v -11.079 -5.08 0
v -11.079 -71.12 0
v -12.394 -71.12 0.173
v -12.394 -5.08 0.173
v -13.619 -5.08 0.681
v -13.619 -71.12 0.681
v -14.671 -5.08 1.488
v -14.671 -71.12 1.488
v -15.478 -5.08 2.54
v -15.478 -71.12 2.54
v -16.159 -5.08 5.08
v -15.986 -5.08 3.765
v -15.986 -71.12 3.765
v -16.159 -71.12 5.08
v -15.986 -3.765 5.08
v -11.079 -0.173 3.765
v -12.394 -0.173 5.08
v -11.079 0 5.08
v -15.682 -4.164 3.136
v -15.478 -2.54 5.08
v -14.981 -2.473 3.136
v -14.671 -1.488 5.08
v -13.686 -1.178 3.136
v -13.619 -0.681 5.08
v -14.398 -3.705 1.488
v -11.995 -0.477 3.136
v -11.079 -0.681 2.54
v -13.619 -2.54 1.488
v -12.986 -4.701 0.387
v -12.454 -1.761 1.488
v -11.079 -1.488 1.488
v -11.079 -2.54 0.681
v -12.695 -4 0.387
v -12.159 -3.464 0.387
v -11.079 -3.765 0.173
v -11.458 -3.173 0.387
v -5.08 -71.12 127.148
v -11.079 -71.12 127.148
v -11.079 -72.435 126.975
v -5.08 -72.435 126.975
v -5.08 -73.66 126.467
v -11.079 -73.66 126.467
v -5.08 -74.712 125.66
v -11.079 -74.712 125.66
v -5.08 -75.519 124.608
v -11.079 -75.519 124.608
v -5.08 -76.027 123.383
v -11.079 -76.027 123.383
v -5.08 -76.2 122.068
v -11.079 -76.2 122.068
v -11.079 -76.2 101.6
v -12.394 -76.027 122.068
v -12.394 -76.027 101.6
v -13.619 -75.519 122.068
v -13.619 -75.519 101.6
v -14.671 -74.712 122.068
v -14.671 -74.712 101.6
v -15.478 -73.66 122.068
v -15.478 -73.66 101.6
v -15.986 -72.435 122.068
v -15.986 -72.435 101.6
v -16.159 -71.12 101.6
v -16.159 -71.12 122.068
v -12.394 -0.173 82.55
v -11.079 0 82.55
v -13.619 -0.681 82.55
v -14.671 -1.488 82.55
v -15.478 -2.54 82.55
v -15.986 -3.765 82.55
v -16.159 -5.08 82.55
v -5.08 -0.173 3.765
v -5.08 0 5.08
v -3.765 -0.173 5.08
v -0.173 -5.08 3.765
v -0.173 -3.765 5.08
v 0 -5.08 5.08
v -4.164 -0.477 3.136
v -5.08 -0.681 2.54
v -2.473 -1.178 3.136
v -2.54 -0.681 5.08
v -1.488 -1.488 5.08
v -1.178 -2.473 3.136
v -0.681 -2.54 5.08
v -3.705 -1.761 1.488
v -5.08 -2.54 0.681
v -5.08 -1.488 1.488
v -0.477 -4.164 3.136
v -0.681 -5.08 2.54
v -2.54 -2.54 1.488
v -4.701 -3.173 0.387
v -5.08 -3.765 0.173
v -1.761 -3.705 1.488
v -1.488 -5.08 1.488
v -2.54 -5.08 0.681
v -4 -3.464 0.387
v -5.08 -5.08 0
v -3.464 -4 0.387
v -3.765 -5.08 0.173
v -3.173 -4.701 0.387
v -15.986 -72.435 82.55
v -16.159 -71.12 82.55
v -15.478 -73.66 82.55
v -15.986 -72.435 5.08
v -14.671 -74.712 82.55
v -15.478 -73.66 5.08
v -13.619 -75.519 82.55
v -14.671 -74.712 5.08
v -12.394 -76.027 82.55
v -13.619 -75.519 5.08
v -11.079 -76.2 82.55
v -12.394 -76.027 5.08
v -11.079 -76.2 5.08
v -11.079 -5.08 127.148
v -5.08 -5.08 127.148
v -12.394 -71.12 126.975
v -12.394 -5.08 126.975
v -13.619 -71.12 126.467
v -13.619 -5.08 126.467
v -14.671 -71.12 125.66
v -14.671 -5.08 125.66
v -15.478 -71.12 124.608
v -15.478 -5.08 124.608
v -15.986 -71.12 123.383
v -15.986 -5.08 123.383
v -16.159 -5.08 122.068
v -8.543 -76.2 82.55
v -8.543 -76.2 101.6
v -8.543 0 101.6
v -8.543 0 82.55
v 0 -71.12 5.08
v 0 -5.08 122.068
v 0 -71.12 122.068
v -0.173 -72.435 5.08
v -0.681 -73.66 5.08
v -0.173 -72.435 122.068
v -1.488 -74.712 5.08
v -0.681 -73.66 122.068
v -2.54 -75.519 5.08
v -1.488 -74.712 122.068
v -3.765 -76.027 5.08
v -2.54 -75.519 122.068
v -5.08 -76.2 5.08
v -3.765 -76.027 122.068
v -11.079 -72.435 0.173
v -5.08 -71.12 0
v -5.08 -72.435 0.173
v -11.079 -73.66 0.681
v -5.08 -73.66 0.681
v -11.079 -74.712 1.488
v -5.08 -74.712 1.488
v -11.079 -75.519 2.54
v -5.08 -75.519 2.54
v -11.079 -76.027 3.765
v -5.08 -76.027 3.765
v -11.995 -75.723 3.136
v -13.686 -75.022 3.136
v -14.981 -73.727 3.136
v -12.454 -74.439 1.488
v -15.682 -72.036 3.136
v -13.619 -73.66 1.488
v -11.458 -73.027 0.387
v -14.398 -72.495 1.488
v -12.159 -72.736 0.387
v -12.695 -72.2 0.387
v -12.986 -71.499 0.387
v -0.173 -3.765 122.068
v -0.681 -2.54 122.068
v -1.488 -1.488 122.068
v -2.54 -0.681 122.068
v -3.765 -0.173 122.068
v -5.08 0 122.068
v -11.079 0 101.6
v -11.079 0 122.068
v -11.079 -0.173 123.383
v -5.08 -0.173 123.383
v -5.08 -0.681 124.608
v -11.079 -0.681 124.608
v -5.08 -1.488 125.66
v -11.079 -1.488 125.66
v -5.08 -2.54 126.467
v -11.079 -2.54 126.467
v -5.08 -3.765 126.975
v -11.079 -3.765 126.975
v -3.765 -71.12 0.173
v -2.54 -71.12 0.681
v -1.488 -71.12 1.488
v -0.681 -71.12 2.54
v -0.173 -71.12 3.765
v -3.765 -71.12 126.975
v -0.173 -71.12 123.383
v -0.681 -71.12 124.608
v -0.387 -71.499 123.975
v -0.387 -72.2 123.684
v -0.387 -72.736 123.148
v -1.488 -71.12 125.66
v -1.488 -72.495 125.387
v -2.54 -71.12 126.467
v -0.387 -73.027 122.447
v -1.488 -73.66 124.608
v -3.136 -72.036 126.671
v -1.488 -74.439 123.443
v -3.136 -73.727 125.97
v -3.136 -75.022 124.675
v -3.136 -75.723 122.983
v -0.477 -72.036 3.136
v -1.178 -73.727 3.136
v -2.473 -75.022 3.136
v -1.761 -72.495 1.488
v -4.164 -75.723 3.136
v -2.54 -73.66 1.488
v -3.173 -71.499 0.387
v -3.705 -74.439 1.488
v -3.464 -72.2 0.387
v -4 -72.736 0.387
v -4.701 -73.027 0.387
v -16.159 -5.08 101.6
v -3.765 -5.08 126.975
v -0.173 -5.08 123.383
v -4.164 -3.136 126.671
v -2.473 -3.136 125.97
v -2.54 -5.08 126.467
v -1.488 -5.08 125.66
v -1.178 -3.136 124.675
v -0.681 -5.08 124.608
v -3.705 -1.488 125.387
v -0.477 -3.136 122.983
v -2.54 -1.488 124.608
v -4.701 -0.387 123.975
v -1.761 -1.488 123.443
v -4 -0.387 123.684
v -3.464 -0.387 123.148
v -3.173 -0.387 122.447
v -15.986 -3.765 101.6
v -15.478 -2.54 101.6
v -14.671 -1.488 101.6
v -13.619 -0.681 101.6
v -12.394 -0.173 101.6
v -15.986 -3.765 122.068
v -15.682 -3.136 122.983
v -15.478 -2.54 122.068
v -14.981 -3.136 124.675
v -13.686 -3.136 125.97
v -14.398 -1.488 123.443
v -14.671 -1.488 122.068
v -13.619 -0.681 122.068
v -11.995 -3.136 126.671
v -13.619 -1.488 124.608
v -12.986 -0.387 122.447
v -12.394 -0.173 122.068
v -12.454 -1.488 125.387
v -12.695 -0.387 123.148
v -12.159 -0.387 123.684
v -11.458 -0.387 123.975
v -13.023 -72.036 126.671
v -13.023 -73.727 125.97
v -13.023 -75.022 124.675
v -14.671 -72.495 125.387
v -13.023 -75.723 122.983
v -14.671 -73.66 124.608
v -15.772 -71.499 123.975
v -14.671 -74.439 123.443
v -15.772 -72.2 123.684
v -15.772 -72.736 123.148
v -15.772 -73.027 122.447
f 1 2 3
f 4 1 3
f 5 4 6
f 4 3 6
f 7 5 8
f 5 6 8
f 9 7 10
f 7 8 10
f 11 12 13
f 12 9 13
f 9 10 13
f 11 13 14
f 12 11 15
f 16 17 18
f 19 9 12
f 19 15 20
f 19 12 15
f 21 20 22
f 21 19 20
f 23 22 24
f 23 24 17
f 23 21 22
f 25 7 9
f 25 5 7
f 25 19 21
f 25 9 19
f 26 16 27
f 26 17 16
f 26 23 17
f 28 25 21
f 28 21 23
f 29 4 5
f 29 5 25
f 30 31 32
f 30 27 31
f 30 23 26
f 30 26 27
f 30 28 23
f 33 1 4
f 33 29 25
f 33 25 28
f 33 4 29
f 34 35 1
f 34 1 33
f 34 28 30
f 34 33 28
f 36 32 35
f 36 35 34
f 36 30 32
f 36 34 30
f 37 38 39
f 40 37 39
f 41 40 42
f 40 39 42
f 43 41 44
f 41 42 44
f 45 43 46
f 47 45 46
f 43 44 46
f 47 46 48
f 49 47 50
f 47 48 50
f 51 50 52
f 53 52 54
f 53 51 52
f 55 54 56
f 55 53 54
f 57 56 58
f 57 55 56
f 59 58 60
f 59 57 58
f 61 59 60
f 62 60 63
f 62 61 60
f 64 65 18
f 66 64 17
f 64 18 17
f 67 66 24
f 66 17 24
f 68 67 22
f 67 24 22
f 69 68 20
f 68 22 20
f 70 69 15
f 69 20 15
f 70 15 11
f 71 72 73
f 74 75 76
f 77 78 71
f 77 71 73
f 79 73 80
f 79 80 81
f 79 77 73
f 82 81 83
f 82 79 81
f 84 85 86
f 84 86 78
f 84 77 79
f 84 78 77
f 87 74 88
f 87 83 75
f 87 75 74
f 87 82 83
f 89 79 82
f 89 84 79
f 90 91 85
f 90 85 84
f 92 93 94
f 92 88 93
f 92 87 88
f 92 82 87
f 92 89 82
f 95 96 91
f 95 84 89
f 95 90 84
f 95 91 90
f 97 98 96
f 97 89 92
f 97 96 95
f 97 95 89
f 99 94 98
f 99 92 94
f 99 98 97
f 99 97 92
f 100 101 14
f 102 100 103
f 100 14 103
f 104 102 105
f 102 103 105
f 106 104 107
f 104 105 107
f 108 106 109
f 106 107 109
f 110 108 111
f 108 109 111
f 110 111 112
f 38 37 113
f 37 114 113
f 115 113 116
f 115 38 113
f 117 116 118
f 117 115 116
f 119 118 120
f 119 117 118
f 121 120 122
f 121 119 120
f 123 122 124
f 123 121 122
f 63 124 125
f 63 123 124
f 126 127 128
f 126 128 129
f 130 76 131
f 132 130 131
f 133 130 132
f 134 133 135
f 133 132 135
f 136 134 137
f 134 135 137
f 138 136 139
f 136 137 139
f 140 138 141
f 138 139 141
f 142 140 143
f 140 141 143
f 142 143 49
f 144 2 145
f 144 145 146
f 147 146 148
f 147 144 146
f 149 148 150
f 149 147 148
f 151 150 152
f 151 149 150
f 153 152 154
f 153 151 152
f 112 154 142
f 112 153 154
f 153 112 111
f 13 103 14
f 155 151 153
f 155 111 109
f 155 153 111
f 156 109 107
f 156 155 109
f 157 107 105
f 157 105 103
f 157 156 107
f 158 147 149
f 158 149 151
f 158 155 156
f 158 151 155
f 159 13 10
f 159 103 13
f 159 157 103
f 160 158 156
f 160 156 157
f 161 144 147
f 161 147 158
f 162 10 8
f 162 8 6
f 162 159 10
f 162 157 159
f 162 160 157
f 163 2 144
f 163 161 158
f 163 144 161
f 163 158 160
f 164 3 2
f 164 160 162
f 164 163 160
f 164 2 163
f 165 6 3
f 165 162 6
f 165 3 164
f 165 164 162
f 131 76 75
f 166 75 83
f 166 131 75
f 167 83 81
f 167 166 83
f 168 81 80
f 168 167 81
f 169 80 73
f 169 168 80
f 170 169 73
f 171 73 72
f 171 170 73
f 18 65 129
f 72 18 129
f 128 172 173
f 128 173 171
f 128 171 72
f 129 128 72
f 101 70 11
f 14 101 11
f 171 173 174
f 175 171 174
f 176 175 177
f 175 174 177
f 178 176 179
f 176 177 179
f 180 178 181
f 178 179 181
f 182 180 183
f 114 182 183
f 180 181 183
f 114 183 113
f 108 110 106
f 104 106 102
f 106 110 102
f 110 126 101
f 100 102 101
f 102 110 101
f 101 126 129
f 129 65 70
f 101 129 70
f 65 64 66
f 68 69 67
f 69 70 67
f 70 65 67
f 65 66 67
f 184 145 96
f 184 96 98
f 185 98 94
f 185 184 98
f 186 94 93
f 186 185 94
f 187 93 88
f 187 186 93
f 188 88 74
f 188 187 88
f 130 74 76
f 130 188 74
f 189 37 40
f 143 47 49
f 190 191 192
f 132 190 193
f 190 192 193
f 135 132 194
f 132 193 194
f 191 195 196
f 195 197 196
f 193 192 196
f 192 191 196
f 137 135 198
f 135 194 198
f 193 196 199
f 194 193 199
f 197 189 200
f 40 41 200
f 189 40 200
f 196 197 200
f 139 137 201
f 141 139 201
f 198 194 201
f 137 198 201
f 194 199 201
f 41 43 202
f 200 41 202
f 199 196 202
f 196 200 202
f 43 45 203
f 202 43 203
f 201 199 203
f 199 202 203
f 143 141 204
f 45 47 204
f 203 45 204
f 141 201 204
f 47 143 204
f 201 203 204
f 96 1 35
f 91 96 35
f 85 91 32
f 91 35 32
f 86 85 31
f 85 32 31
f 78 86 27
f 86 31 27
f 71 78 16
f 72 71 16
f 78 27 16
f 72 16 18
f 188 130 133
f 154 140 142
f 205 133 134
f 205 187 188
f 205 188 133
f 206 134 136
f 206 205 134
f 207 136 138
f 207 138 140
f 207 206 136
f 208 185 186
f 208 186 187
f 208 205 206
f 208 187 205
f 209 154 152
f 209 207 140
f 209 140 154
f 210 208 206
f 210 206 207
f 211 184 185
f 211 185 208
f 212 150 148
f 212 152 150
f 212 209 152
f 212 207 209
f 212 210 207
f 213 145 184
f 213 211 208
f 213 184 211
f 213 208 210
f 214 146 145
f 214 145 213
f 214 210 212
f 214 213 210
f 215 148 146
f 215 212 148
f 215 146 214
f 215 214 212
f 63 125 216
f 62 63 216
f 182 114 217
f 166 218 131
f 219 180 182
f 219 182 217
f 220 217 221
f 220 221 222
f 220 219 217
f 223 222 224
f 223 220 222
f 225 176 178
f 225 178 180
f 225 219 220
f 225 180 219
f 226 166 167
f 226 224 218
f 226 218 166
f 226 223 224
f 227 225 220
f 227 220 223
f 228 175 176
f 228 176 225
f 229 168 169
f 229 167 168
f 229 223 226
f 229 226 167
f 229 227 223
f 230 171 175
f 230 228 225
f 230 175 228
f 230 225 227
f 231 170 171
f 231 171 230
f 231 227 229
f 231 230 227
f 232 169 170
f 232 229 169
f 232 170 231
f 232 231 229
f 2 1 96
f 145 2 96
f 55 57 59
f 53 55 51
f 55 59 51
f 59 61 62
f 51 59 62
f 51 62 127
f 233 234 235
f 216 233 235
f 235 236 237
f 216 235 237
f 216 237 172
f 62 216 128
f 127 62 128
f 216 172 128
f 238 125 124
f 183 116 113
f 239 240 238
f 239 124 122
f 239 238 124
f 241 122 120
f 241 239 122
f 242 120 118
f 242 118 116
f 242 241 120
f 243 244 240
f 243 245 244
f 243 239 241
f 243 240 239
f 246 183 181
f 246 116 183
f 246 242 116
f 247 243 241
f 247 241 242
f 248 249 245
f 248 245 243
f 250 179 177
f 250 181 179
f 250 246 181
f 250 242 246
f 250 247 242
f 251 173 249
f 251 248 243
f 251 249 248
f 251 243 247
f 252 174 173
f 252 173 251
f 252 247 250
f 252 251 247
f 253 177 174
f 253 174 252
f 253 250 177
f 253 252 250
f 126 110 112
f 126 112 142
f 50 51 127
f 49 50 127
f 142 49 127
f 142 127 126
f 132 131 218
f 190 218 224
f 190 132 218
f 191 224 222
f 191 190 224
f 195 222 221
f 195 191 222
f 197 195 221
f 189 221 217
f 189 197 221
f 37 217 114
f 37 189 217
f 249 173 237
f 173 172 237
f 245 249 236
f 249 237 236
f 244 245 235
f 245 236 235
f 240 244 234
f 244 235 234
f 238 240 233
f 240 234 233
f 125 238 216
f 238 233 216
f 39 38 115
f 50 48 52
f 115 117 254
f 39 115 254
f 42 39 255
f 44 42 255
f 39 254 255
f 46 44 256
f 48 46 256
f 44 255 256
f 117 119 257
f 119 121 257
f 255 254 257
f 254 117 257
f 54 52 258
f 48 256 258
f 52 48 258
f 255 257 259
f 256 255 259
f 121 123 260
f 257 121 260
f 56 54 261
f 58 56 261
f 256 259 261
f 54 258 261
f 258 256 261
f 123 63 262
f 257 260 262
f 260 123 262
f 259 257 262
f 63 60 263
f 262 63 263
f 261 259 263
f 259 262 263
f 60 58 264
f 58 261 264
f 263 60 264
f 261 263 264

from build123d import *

# Parameters (mm, degrees)
F1_DEPTH     = 76.2
F2_R         = 5.08
F3_R         = 5.08
F4_T1_DEPTH  = 5.998990562
F4_S5_W      = 5.08
F4_S5_H      = 5.08
F4_T6_DEPTH  = 5.08
F4_S11_W     = 5.08
F4_S11_H     = 5.08
F4_T12_DEPTH = 5.08
F4_S17_W     = 5.08
F4_S17_H     = 5.08
F4_T18_DEPTH = 5.08
F4_S23_W     = 5.08
F4_S23_H     = 5.08
F4_T24_DEPTH = 5.08
F4_S29_W     = 5.08
F4_S29_H     = 5.08
F4_T30_DEPTH = 5.08
F4_S35_W     = 5.08
F4_S35_H     = 5.08
F4_T36_DEPTH = 5.08


# Not quite as in the source:
# - a fillet or chamfer that OpenCascade refuses, or shapes differently, is made with other operations: its cross-section is extruded or revolved along the edge and cut away or added


with BuildPart() as f1:
    # F0 (on Front) → F1 (new body)
    with BuildSketch(Plane.XZ):
        Polygon((-16.158990562, 0), (0, 0), (0, 127.1478682756), (-16.158990562, 127.1478682756), (-16.158990562, 101.6), (-8.5426843725, 101.6), (-8.5426843725, 82.55), (-16.158990562, 82.55), align=None)
    extrude(amount=F1_DEPTH)

    # F2
    f2_edges = [f1.edges().sort_by_distance(p)[0] for p in [
        (-8.079495, -76.2, 127.147868),
        (0, -38.1, 0),
        (0, -38.1, 127.147868),
        (0, 0, 63.573934),
        (0, -76.2, 63.573934),
    ]]
    fillet(f2_edges, radius=F2_R)

    # F3
    f3_edges = [f1.edges().sort_by_distance(p)[0] for p in [
        (-16.158991, -76.2, 41.275),
        (-16.158991, 0, 41.275),
        (-16.158991, -38.1, 0),
        (-16.158991, 0, 114.373934),
        (-16.158991, -35.56, 127.147868),
    ]]
    fillet(f3_edges, radius=F3_R)

    # F4: fillet of radius 5.08 on 3 edges, made by hand

    # F4_s2 → F4_t1 (cut)
    with BuildSketch(Plane.YZ.offset(-11.078990562)):
        with BuildLine():
            ThreePointArc((0, 122.0678682756), (-1.4878975516, 125.6599707241), (-5.08, 127.1478682756))
            Line((-5.08, 127.1478682756), (0, 127.1478682756))
            Line((0, 127.1478682756), (0, 122.0678682756))
        make_face()
        with BuildLine():
            ThreePointArc((-5.08, 0), (-1.4878975516, 1.4878975516), (0, 5.08))
            Line((0, 5.08), (0, 0))
            Line((0, 0), (-5.08, 0))
        make_face()
        with BuildLine():
            ThreePointArc((-71.12, 0), (-74.7121024484, 1.4878975516), (-76.2, 5.08))
            Line((-76.2, 5.08), (-76.2, 0))
            Line((-76.2, 0), (-71.12, 0))
        make_face()
    extrude(amount=F4_T1_DEPTH, mode=Mode.SUBTRACT)


with BuildPart() as f4_tool4:
    # F4_s5 → F4_t6 (new body)
    with BuildSketch(Plane.XY.offset(5.08)):
        with Locations((-13.618990562, -73.66)):
            Rectangle(F4_S5_W, F4_S5_H)
    extrude(amount=-F4_T6_DEPTH)

    # F4_s7 → F4_t8 (revolve, cut)
    with BuildSketch(Plane(origin=(-11.078990562, -71.12, 5.08), x_dir=(0.7071067812, 0.7071067812, 0), z_dir=(-0.7071067812, 0.7071067812, 0))):
        with BuildLine():
            ThreePointArc((0, -5.08), (5.08, 0), (0, 5.08))
            Line((0, 5.08), (0, -5.08))
        make_face()
    revolve(axis=Axis((-11.078990562, -71.12, 5.08), (0, 0, -1)), mode=Mode.SUBTRACT)


with BuildPart() as f1_1:
    add(f1.part)

    # F4_t3: cut F4_tool4
    add(f4_tool4.part, mode=Mode.SUBTRACT)


with BuildPart() as f4_tool10:
    # F4_s11 → F4_t12 (new body)
    with BuildSketch(Plane.XY.offset(5.08)):
        with Locations((-2.54, -73.66)):
            Rectangle(F4_S11_W, F4_S11_H)
    extrude(amount=-F4_T12_DEPTH)

    # F4_s13 → F4_t14 (revolve, cut)
    with BuildSketch(Plane(origin=(-5.08, -71.12, 5.08), x_dir=(-0.7071067812, 0.7071067812, 0), z_dir=(-0.7071067812, -0.7071067812, 0))):
        with BuildLine():
            ThreePointArc((0, -5.08), (5.08, 0), (0, 5.08))
            Line((0, 5.08), (0, -5.08))
        make_face()
    revolve(axis=Axis((-5.08, -71.12, 5.08), (0, 0, -1)), mode=Mode.SUBTRACT)


with BuildPart() as f1_2:
    add(f1_1.part)

    # F4_t9: cut F4_tool10
    add(f4_tool10.part, mode=Mode.SUBTRACT)


with BuildPart() as f4_tool16:
    # F4_s17 → F4_t18 (new body)
    with BuildSketch(Plane.XY.offset(5.08)):
        with Locations((-13.618990562, -2.54)):
            Rectangle(F4_S17_W, F4_S17_H)
    extrude(amount=-F4_T18_DEPTH)

    # F4_s19 → F4_t20 (revolve, cut)
    with BuildSketch(Plane(origin=(-11.078990562, -5.08, 5.08), x_dir=(0.7071067812, -0.7071067812, 0), z_dir=(0.7071067812, 0.7071067812, 0))):
        with BuildLine():
            ThreePointArc((0, -5.08), (5.08, 0), (0, 5.08))
            Line((0, 5.08), (0, -5.08))
        make_face()
    revolve(axis=Axis((-11.078990562, -5.08, 5.08), (0, 0, -1)), mode=Mode.SUBTRACT)


with BuildPart() as f1_3:
    add(f1_2.part)

    # F4_t15: cut F4_tool16
    add(f4_tool16.part, mode=Mode.SUBTRACT)


with BuildPart() as f4_tool22:
    # F4_s23 → F4_t24 (new body)
    with BuildSketch(Plane.XY.offset(5.08)):
        with Locations((-2.54, -2.54)):
            Rectangle(F4_S23_W, F4_S23_H)
    extrude(amount=-F4_T24_DEPTH)

    # F4_s25 → F4_t26 (revolve, cut)
    with BuildSketch(Plane(origin=(-5.08, -5.08, 5.08), x_dir=(-0.7071067812, -0.7071067812, 0), z_dir=(0.7071067812, -0.7071067812, 0))):
        with BuildLine():
            ThreePointArc((0, -5.08), (5.08, 0), (0, 5.08))
            Line((0, 5.08), (0, -5.08))
        make_face()
    revolve(axis=Axis((-5.08, -5.08, 5.08), (0, 0, -1)), mode=Mode.SUBTRACT)


with BuildPart() as f1_4:
    add(f1_3.part)

    # F4_t21: cut F4_tool22
    add(f4_tool22.part, mode=Mode.SUBTRACT)


with BuildPart() as f4_tool28:
    # F4_s29 → F4_t30 (new body)
    with BuildSketch(Plane.XZ.offset(5.08)):
        with Locations((-2.54, 124.6078682756)):
            Rectangle(F4_S29_W, F4_S29_H)
    extrude(amount=-F4_T30_DEPTH)

    # F4_s31 → F4_t32 (revolve, cut)
    with BuildSketch(Plane(origin=(-5.08, -5.08, 122.0678682756), x_dir=(-0.7071067812, 0, -0.7071067812), z_dir=(0.7071067812, 0, -0.7071067812))):
        with BuildLine():
            ThreePointArc((0, -5.08), (5.08, 0), (0, 5.08))
            Line((0, 5.08), (0, -5.08))
        make_face()
    revolve(axis=Axis((-5.08, -5.08, 122.0678682756), (0, 1, 0)), mode=Mode.SUBTRACT)


with BuildPart() as f1_5:
    add(f1_4.part)

    # F4_t27: cut F4_tool28
    add(f4_tool28.part, mode=Mode.SUBTRACT)


with BuildPart() as f4_tool34:
    # F4_s35 → F4_t36 (new body)
    with BuildSketch(Plane.XZ.offset(5.08)):
        with Locations((-13.618990562, 124.6078682756)):
            Rectangle(F4_S35_W, F4_S35_H)
    extrude(amount=-F4_T36_DEPTH)

    # F4_s37 → F4_t38 (revolve, cut)
    with BuildSketch(Plane(origin=(-11.078990562, -5.08, 122.0678682756), x_dir=(0.7071067812, 0, -0.7071067812), z_dir=(0.7071067812, 0, 0.7071067812))):
        with BuildLine():
            ThreePointArc((0, -5.08), (5.08, 0), (0, 5.08))
            Line((0, 5.08), (0, -5.08))
        make_face()
    revolve(axis=Axis((-11.078990562, -5.08, 122.0678682756), (0, 1, 0)), mode=Mode.SUBTRACT)


with BuildPart() as f1_6:
    add(f1_5.part)

    # F4_t33: cut F4_tool34
    add(f4_tool34.part, mode=Mode.SUBTRACT)


solid = f1_6.part
